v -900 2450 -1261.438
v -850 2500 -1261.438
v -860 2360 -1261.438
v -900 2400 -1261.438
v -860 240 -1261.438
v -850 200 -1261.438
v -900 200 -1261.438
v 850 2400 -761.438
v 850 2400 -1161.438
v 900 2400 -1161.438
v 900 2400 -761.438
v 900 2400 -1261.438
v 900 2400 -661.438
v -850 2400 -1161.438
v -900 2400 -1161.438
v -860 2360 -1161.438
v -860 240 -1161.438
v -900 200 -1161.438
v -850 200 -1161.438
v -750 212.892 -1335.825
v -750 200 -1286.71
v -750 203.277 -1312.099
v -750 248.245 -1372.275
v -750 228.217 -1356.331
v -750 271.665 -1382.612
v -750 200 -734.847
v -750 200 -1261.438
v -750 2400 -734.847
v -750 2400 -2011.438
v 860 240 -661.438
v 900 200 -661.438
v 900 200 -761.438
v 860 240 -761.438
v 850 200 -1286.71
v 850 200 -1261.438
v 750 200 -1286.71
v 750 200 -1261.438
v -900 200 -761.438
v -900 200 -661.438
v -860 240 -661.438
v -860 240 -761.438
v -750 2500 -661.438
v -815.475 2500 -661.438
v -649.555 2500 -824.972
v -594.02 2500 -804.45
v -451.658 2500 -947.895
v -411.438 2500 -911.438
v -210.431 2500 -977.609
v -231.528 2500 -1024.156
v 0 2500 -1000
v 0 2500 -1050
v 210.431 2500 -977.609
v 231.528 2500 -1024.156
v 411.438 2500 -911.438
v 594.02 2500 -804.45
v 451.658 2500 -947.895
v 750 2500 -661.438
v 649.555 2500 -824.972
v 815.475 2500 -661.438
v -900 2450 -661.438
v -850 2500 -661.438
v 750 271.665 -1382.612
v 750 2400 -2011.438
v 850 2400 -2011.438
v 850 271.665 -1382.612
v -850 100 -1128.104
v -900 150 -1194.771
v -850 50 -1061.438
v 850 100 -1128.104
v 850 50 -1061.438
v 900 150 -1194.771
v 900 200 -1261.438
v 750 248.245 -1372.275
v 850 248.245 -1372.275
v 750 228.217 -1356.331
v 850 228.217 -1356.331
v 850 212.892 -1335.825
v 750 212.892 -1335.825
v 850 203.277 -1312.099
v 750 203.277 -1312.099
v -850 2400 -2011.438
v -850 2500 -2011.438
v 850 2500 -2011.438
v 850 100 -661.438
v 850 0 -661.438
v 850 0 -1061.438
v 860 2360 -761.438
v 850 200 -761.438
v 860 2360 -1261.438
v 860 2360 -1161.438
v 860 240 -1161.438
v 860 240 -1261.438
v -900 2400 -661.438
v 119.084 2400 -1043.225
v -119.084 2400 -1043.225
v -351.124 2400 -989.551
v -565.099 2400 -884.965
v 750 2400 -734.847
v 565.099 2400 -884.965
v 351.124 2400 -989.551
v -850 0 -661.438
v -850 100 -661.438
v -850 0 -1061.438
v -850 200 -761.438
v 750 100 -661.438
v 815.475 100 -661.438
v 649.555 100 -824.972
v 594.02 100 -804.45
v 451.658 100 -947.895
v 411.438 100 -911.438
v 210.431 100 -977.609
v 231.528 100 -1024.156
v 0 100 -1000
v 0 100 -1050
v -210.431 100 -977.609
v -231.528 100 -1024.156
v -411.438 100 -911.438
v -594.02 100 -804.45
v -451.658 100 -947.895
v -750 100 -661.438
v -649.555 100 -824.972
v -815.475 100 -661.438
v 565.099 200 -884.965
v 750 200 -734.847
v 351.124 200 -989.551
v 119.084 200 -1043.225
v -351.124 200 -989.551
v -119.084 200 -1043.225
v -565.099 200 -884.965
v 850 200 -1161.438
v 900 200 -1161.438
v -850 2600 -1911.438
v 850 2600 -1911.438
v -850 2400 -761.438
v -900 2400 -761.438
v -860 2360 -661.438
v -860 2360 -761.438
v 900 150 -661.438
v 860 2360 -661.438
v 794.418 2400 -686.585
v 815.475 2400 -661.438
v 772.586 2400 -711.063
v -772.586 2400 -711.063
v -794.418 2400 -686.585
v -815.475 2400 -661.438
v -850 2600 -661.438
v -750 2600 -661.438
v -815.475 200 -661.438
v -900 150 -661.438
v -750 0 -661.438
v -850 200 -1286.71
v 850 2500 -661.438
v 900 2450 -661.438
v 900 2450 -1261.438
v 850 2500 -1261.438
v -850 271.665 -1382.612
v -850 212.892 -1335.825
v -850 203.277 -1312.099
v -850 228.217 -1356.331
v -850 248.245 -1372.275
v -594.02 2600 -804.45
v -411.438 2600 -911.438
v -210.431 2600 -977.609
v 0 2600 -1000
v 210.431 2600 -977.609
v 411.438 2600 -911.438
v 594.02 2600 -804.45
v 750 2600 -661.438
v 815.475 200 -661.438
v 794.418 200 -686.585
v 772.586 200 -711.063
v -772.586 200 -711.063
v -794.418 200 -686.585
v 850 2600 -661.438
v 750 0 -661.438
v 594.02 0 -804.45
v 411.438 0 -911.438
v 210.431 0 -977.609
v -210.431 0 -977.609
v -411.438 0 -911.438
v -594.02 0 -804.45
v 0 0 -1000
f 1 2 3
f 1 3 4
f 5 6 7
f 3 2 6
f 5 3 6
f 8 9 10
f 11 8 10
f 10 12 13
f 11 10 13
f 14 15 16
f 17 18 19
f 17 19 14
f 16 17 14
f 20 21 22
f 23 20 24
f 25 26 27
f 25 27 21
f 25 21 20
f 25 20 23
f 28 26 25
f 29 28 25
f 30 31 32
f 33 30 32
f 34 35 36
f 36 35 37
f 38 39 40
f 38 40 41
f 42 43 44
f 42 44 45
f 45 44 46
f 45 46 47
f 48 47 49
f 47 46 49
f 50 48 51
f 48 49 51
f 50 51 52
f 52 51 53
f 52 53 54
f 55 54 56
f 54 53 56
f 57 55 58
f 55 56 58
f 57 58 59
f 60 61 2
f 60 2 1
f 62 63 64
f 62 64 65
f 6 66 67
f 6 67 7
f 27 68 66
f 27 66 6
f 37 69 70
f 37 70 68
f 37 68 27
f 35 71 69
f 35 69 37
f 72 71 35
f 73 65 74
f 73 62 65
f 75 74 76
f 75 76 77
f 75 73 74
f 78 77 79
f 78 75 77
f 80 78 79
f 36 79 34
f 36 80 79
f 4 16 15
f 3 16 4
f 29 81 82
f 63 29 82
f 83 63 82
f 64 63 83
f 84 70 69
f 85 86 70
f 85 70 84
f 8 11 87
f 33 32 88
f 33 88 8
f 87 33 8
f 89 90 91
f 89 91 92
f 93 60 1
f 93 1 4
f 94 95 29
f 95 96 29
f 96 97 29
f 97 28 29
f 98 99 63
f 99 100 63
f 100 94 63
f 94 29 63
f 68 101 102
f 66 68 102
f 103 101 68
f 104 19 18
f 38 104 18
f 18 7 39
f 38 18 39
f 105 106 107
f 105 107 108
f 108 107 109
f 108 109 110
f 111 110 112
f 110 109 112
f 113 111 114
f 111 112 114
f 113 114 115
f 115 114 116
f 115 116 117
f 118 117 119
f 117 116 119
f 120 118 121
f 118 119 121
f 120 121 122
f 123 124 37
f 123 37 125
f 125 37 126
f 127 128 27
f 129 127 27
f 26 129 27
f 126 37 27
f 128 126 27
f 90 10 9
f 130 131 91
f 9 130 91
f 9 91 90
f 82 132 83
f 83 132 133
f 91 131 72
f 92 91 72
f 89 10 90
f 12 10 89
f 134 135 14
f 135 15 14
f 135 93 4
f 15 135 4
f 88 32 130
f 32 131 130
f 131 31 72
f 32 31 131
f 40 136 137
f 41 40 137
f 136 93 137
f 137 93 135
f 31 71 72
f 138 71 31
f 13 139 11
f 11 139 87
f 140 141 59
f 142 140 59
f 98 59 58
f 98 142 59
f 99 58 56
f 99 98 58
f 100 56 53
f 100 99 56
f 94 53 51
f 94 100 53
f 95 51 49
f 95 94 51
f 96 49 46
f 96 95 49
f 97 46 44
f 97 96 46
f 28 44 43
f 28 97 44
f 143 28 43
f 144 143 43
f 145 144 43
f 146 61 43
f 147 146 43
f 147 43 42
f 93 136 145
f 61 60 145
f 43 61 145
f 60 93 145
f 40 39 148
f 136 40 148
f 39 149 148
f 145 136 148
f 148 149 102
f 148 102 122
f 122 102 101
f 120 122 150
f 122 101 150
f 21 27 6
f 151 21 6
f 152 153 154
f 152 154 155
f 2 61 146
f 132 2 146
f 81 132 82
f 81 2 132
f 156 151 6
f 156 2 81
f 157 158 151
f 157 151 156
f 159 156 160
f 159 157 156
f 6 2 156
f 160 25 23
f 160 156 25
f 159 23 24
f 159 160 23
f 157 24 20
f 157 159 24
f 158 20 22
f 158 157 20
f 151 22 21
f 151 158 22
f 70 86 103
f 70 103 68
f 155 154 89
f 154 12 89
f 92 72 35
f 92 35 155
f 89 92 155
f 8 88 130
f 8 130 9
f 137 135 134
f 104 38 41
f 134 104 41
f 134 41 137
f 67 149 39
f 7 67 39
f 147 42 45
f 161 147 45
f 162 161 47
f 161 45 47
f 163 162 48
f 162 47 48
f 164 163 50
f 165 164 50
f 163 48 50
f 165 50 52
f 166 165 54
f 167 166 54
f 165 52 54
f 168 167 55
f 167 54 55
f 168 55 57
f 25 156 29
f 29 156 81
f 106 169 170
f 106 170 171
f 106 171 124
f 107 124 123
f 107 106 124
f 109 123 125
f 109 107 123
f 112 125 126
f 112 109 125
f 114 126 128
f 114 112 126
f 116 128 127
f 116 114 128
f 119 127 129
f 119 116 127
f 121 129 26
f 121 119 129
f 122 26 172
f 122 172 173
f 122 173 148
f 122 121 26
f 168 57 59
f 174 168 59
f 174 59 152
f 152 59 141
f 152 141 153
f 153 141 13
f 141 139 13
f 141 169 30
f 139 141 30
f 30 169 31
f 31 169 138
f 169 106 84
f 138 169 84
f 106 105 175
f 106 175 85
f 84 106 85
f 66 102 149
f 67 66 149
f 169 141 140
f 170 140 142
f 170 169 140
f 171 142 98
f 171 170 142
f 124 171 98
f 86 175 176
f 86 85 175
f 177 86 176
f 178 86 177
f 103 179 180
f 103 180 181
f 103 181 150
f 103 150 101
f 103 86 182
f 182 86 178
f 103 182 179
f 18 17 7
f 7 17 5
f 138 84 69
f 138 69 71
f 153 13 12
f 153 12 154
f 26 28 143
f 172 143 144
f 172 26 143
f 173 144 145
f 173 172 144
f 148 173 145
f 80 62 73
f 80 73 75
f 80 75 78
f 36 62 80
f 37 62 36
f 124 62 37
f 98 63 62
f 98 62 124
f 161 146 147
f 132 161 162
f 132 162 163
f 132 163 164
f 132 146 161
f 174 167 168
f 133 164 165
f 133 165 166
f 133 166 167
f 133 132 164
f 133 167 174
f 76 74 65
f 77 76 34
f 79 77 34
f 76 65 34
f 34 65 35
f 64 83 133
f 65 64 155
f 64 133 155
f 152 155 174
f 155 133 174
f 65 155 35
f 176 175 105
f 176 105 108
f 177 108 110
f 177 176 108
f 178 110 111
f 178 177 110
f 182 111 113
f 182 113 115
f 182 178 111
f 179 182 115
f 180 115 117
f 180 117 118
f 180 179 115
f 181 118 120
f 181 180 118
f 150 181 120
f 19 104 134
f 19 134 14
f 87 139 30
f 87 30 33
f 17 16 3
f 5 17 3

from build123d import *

# Parameters (mm, degrees)
BOSS_EXTRUDE1_DEPTH  = 100
BOSS_EXTRUDE2_DEPTH  = 100
CUT_EXTRUDE1_DEPTH   = 1101
BOSS_EXTRUDE3_DEPTH  = 2200
SKETCH6_W            = 10
SKETCH6_H            = 100
BOSS_EXTRUDE4_DEPTH  = 2200
SKETCH7_W            = 100
SKETCH7_H            = 2200
BOSS_EXTRUDE6_DEPTH  = 100
CHAMFER2_SIZE        = 40
MIRROR2_START        = -1261.437827766
MIRROR2_DEPTH        = 211.43967231
MIRROR2_START_2      = -1049.998155456
MIRROR2_2_DEPTH      = 388.56032769
MIRROR2_START_3      = 2400
MIRROR2_3_DEPTH      = 100
CHAMFER3_SIZE        = 40
BOSS_EXTRUDE7_DEPTH  = 100
BOSS_EXTRUDE8_DEPTH  = 100
FILLET2_R            = 100
BOSS_EXTRUDE9_DEPTH  = 100
SKETCH13_W           = 1700
SKETCH13_H           = 750
BOSS_EXTRUDE12_DEPTH = 200
CHAMFER5_SIZE        = 100
CUT_EXTRUDE2_DEPTH   = 3748.78362969


with BuildPart() as part:
    # Sketch1 → Boss-Extrude1 (new body)
    with BuildSketch(Plane(origin=(0, 0, 0), x_dir=(1, 0, 0), z_dir=(0, 1, 0))):
        with BuildLine():
            Line((-750, 661.437827766), (-850, 661.437827766))
            Line((-850, 661.437827766), (-850, 1261.437827766))
            Line((-850, 1261.437827766), (850, 1261.437827766))
            Line((850, 1261.437827766), (850, 661.437827766))
            Line((850, 661.437827766), (750, 661.437827766))
            ThreePointArc((750, 661.437827766), (0, 1000), (-750, 661.437827766))
        make_face()
    extrude(amount=BOSS_EXTRUDE1_DEPTH)

    # Sketch2 → Boss-Extrude2 (add)
    with BuildSketch(Plane(origin=(0, 100, 0), x_dir=(1, 0, 0), z_dir=(0, 1, 0))):
        with BuildLine():
            Line((850, 1261.437827766), (900, 1261.437827766))
            Line((900, 1261.437827766), (900, 661.437827766))
            Line((900, 661.437827766), (815.475321515, 661.437827766))
            ThreePointArc((815.475321515, 661.437827766), (0, 1050), (-815.475321515, 661.437827766))
            Line((-815.475321515, 661.437827766), (-850, 661.437827766))
            Line((-850, 661.437827766), (-900, 661.437827766))
            Line((-900, 661.437827766), (-900, 1261.437827766))
            Line((-900, 1261.437827766), (-850, 1261.437827766))
            Line((-850, 1261.437827766), (850, 1261.437827766))
        make_face()
    extrude(amount=BOSS_EXTRUDE2_DEPTH)

    # Sketch4 → Cut-Extrude1 (cut, through all)
    with BuildSketch(Plane.XY.offset(-661.437827766)):
        Polygon((-850, 100), (-900, 150), (-900, 100), align=None)
        Polygon((850, 100), (900, 150), (900, 100), align=None)
    extrude(amount=-CUT_EXTRUDE1_DEPTH, mode=Mode.SUBTRACT)

    # Sketch5 → Boss-Extrude3 (add)
    with BuildSketch(Plane(origin=(0, 200, 0), x_dir=(1, 0, 0), z_dir=(0, 1, 0))):
        with BuildLine():
            Line((-750, 1261.437827766), (-750, 734.846922835))
            ThreePointArc((-750, 734.846922835), (-783.597772698, 698.90952964), (-815.475321515, 661.437827766))
            Line((-815.475321515, 661.437827766), (-850, 661.437827766))
            Line((-850, 661.437827766), (-850, 1261.437827766))
            Line((-850, 1261.437827766), (-750, 1261.437827766))
        make_face()
        with BuildLine():
            Line((850, 661.437827766), (815.475321515, 661.437827766))
            ThreePointArc((815.475321515, 661.437827766), (783.597772698, 698.90952964), (750, 734.846922835))
            Line((750, 734.846922835), (750, 1261.437827766))
            Line((750, 1261.437827766), (850, 1261.437827766))
            Line((850, 1261.437827766), (850, 661.437827766))
        make_face()
    extrude(amount=BOSS_EXTRUDE3_DEPTH)

    # Sketch6 → Boss-Extrude4 (add)
    with BuildSketch(Plane(origin=(0, 200, 0), x_dir=(1, 0, 0), z_dir=(0, 1, 0))):
        with Locations((-855, 1211.437827766)):
            Rectangle(SKETCH6_W, SKETCH6_H)
        with Locations((-855, 711.437827766)):
            Rectangle(SKETCH6_W, SKETCH6_H)
    boss_extrude4 = extrude(amount=BOSS_EXTRUDE4_DEPTH)

    # Sketch7 → Boss-Extrude6 (add)
    with BuildSketch(Plane(origin=(0, 0, -1261.437827766), x_dir=(-1, 0, 0), z_dir=(0, 0, -1))):
        with Locations((-800, 1300)):
            Rectangle(SKETCH7_W, SKETCH7_H)
        with Locations((800, 1300)):
            Rectangle(SKETCH7_W, SKETCH7_H)
    extrude(amount=BOSS_EXTRUDE6_DEPTH)

    # Mirror1: Boss-Extrude4 across plane
    add(boss_extrude4.mirror(Plane(origin=(0, 0, 0), x_dir=(0, 0, 1), z_dir=(1, 0, 0))))

    # Chamfer2
    chamfer2_edges = [part.edges().sort_by_distance(p)[0] for p in [
        (-860, 200, -1211.437827766),
        (-860, 200, -711.437827766),
        (860, 200, -1211.437827766),
        (860, 200, -711.437827766),
    ]]
    chamfer(chamfer2_edges, length=CHAMFER2_SIZE - 0.0001)  # a hair under: the kernel refuses the full size

    # Mirror2: read off the stored shape, not the designer's step
    # Mirror2 outline → Mirror2 (add)
    with BuildSketch(Plane.XY.offset(MIRROR2_START)):
        Polygon((-850, 2500), (-900, 2450), (-900, 2400), (900, 2400), (900, 2450), (850, 2500), align=None)
    extrude(amount=MIRROR2_DEPTH)

    # Mirror2 2 outline → Mirror2 2 (add)
    with BuildSketch(Plane.XY.offset(MIRROR2_START_2)):
        Polygon((-850, 2500), (-900, 2450), (-900, 2400), (900, 2400), (900, 2450), (850, 2500), align=None)
    extrude(amount=MIRROR2_2_DEPTH)

    # Mirror2 3 outline → Mirror2 3 (cut)
    with BuildSketch(Plane(origin=(0, 0, 0), x_dir=(1, 0, 0), z_dir=(0, 1, 0)).offset(MIRROR2_START_3)):
        with BuildLine():
            ThreePointArc((815.475321515, 661.437827766), (0, 1050), (-815.475321515, 661.437827766))
            Line((-815.475321515, 661.437827766), (815.475321515, 661.437827766))
        make_face()
    extrude(amount=MIRROR2_3_DEPTH, mode=Mode.SUBTRACT)

    # Chamfer3
    chamfer3_edges = [part.edges().sort_by_distance(p)[0] for p in [
        (860, 2400, -1211.437827766),
        (860, 2400, -711.437827766),
        (-860, 2400, -711.437827766),
        (-860, 2400, -1211.437827766),
    ]]
    chamfer(chamfer3_edges, length=CHAMFER3_SIZE - 0.0001)  # a hair under: the kernel refuses the full size

    # Sketch9 → Boss-Extrude7 (add)
    with BuildSketch(Plane.ZY.offset(850)):
        Polygon((-1361.437827766, 200), (-2011.437827766, 2400), (-1361.437827766, 2400), align=None)
    extrude(amount=-BOSS_EXTRUDE7_DEPTH)

    # Sketch10 → Boss-Extrude8 (add)
    with BuildSketch(Plane.ZY.offset(-750)):
        Polygon((-2011.437827766, 2400), (-1361.437827766, 200), (-1361.437827766, 2400), align=None)
    extrude(amount=-BOSS_EXTRUDE8_DEPTH)

    # Fillet2
    fillet2_edges = [part.edges().sort_by_distance(p)[0] for p in [
        (-800, 200, -1361.437827766),
        (800, 200, -1361.437827766),
    ]]
    fillet(fillet2_edges, radius=FILLET2_R)

    # Sketch11 → Boss-Extrude9 (add)
    with BuildSketch(Plane(origin=(0, 2500, 0), x_dir=(1, 0, 0), z_dir=(0, 1, 0))):
        with BuildLine():
            Line((-850, 661.437827766), (-750, 661.437827766))
            ThreePointArc((-750, 661.437827766), (0, 1000), (750, 661.437827766))
            Line((750, 661.437827766), (850, 661.437827766))
            Line((850, 661.437827766), (850, 1261.437827766))
            Line((850, 1261.437827766), (-850, 1261.437827766))
            Line((-850, 1261.437827766), (-850, 661.437827766))
        make_face()
    extrude(amount=BOSS_EXTRUDE9_DEPTH)

    # Sketch13 → Boss-Extrude12 (add)
    with BuildSketch(Plane(origin=(0, 2400, 0), x_dir=(1, 0, 0), z_dir=(0, 1, 0))):
        with Locations((0, 1636.437827766)):
            Rectangle(SKETCH13_W, SKETCH13_H)
    extrude(amount=BOSS_EXTRUDE12_DEPTH)

    # Chamfer5
    chamfer5_edges = [part.edges().sort_by_distance(p)[0] for p in [
        (0, 2600, -2011.437827766),
    ]]
    chamfer(chamfer5_edges, length=CHAMFER5_SIZE)

    # Sketch14 → Cut-Extrude2 (cut, through all)
    with BuildSketch(Plane(origin=(900, 0, 0), x_dir=(0, 0, -1), z_dir=(1, 0, 0))):
        Polygon((1061.437827766, 50), (1261.437827766, 200), (1261.437827766, 50), (1261.437827766, 0), (1061.437827766, 0), align=None)
    extrude(amount=-CUT_EXTRUDE2_DEPTH, mode=Mode.SUBTRACT)


solid = part.part
